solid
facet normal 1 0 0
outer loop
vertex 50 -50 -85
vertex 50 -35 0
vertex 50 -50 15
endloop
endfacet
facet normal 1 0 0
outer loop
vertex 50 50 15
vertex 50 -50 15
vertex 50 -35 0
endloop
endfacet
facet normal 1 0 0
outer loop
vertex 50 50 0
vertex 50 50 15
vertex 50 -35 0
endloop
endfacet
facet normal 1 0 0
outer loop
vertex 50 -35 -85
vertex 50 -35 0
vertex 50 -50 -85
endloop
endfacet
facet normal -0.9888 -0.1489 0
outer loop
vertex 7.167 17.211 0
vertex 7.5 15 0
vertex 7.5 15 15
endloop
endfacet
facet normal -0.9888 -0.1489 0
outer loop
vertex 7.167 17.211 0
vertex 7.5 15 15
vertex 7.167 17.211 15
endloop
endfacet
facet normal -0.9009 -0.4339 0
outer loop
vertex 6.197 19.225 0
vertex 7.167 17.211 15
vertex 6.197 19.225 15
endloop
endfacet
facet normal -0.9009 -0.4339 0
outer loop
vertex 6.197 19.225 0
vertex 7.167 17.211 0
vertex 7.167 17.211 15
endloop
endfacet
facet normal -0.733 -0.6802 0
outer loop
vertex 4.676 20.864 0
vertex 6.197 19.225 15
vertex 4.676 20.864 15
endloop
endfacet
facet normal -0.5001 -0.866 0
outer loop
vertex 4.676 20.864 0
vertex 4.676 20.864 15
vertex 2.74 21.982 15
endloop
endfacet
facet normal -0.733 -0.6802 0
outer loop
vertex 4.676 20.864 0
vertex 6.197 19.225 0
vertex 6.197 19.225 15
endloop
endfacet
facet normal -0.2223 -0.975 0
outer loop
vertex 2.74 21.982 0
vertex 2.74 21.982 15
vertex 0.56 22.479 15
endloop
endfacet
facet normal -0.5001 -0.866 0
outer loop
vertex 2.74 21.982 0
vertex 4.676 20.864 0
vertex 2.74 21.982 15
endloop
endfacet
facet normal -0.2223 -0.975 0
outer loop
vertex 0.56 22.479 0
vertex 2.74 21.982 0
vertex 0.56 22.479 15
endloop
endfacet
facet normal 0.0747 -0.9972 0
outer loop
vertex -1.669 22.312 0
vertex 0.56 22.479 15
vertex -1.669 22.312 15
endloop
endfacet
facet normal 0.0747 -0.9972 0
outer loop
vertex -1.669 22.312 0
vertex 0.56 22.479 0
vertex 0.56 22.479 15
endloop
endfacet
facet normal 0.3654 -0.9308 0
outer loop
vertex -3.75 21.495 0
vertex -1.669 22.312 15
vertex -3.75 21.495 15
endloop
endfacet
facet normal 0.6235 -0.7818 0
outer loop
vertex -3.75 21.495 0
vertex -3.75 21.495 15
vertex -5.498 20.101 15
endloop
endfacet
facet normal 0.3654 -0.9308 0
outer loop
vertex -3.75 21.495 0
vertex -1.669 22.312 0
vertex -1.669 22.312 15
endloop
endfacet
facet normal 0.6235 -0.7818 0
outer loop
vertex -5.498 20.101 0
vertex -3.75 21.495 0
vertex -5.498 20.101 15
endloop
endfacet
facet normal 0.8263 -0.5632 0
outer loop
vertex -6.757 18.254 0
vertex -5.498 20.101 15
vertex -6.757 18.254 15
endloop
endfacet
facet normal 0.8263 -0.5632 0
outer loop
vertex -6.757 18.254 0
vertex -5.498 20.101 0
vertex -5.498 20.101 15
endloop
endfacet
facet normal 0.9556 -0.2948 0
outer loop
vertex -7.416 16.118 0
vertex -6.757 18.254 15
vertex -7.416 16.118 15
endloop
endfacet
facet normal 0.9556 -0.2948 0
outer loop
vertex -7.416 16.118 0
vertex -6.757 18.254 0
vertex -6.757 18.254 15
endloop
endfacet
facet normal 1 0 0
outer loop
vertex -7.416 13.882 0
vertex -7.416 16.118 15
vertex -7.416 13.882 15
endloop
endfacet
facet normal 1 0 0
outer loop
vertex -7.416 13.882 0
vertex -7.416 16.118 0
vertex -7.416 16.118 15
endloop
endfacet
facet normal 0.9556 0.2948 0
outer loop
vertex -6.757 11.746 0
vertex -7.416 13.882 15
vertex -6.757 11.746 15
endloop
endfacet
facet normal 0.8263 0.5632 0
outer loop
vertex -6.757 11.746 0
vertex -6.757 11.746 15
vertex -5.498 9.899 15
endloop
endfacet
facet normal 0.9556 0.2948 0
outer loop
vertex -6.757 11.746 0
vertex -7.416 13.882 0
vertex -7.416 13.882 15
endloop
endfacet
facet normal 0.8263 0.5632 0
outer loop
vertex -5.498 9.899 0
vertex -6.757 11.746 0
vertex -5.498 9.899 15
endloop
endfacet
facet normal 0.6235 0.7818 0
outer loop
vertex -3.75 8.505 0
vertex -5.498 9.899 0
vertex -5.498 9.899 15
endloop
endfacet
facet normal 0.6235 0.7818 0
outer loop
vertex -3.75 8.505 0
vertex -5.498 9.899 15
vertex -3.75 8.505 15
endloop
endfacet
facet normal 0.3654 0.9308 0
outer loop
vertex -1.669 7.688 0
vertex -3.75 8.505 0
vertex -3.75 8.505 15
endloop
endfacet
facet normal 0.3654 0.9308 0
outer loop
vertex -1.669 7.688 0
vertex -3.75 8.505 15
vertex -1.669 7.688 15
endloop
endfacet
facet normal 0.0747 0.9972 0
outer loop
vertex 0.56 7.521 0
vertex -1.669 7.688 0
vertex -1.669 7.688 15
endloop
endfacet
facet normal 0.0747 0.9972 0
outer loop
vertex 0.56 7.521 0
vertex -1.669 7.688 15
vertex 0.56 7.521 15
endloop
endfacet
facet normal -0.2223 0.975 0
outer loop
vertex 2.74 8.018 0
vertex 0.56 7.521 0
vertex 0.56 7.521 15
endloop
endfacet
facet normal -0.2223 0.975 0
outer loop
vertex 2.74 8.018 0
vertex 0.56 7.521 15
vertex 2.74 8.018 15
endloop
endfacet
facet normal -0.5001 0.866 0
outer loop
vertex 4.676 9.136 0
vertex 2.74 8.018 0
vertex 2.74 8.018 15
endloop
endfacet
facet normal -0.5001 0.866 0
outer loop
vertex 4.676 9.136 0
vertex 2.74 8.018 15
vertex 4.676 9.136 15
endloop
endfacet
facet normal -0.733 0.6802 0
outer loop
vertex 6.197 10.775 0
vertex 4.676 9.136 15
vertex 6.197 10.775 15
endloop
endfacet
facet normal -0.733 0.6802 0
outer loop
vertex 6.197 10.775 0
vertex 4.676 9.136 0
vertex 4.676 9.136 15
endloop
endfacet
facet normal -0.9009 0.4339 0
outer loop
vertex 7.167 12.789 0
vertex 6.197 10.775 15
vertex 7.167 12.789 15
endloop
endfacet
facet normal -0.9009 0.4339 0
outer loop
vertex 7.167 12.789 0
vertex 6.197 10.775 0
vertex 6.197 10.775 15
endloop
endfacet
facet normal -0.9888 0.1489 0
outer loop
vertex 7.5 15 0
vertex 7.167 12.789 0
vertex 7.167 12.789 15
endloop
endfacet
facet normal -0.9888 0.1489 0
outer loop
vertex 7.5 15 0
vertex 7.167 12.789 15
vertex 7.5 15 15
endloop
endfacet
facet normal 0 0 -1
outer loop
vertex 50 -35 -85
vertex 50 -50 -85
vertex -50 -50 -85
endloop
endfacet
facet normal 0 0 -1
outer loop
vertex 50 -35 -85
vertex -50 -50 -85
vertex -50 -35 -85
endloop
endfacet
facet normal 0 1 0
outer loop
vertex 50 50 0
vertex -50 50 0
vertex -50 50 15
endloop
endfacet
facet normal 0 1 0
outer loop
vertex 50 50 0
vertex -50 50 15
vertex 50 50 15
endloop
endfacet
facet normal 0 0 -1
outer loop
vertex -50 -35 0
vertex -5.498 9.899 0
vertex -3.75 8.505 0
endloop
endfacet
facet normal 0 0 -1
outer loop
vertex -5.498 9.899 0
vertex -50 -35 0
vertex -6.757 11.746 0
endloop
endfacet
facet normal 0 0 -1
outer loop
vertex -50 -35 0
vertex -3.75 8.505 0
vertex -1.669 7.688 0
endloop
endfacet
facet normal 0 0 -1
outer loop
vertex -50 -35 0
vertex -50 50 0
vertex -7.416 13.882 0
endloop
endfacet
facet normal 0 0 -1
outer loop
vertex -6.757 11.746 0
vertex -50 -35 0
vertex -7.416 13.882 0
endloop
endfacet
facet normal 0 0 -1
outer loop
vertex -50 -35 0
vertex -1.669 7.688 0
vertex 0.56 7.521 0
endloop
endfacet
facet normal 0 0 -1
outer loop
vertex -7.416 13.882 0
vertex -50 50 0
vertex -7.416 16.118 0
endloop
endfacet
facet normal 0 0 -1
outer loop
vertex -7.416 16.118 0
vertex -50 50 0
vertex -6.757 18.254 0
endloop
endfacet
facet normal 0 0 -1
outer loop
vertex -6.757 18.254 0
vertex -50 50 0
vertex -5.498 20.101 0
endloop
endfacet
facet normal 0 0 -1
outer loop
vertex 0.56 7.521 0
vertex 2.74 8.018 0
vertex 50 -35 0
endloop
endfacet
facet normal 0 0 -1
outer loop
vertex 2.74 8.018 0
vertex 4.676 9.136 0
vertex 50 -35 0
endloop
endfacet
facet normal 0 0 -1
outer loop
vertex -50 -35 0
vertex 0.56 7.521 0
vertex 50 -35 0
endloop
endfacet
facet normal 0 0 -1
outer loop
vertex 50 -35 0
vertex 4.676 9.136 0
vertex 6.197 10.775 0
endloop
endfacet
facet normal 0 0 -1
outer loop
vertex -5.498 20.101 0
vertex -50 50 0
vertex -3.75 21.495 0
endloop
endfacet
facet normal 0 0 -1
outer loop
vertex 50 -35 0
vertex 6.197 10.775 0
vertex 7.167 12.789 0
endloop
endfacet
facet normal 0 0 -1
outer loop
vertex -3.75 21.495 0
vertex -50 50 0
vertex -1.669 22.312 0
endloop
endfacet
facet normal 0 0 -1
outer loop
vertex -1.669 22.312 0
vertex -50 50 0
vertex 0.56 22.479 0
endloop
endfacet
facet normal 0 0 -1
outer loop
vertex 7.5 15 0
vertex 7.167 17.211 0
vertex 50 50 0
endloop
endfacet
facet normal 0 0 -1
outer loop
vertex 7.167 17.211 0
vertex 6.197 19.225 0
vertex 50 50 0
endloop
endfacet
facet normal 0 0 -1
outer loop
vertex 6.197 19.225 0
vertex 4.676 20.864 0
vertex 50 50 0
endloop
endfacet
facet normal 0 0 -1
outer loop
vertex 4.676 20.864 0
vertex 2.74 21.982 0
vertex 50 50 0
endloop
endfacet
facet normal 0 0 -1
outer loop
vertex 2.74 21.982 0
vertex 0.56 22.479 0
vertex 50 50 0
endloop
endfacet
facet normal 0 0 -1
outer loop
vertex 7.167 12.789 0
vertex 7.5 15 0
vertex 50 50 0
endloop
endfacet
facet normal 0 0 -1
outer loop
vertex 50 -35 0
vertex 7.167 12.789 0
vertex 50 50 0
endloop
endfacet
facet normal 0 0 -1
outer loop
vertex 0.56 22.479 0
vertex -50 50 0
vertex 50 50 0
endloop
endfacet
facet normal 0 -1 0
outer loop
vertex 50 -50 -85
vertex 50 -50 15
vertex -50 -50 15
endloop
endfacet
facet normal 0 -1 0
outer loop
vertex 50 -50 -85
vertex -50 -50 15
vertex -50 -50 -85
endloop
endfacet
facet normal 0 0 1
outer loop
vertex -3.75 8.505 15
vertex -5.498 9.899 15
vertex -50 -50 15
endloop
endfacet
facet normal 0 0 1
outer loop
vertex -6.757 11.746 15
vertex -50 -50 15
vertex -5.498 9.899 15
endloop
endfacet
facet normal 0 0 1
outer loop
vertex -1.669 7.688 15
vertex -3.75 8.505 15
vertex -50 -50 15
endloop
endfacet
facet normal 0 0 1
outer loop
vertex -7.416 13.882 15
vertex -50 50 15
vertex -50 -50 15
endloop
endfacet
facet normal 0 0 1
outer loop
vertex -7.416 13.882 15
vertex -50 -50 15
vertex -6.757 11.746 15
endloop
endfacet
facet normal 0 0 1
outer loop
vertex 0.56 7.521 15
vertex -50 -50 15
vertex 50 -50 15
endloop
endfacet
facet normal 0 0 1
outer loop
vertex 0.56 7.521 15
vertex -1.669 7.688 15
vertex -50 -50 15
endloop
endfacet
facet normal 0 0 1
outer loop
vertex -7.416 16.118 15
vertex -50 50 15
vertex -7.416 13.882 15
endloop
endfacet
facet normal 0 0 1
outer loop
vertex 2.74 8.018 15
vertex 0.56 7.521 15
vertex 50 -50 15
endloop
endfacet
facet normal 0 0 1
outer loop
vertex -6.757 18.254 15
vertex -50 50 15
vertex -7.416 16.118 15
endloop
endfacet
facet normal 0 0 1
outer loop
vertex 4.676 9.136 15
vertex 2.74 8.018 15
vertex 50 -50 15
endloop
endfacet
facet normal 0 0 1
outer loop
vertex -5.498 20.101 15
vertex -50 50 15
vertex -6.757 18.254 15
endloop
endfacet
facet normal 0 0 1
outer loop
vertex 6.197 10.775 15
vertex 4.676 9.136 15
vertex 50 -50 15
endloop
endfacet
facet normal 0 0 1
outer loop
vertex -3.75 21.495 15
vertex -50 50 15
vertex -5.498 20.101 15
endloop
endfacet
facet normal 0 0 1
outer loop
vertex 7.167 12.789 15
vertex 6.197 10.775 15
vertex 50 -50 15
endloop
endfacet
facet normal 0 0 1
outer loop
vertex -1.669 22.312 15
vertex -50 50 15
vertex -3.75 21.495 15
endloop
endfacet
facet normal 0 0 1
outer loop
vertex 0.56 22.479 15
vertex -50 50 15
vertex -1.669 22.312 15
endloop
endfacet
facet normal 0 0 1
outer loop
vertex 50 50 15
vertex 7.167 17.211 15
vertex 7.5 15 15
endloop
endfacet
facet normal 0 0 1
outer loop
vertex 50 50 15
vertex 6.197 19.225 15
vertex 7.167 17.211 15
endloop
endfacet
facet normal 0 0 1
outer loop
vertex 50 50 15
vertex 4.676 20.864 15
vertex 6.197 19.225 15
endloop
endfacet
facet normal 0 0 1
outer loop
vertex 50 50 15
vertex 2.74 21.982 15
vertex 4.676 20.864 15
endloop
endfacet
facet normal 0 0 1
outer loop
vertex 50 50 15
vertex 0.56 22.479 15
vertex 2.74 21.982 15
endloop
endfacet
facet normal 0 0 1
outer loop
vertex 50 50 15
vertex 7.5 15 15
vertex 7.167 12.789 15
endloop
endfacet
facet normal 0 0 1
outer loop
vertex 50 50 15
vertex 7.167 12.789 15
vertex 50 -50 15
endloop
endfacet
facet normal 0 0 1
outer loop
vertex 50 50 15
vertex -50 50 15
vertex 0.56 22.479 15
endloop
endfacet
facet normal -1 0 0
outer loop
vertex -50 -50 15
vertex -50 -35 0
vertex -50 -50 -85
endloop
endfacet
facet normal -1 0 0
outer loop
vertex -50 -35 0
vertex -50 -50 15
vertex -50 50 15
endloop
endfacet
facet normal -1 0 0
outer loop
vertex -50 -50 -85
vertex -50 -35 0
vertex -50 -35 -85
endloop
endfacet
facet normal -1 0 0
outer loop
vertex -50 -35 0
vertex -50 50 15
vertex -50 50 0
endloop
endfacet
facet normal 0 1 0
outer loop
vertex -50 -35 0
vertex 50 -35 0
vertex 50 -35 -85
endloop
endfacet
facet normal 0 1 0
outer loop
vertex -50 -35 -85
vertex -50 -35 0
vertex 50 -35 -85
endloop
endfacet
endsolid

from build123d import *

# Parameters (mm, degrees)
SKETCH1_W           = 100
SKETCH1_H           = 100
SKETCH1_R           = 7.5
BOSS_EXTRUDE1_DEPTH = 15
SKETCH2_W           = 85
SKETCH2_H           = 15
BOSS_EXTRUDE2_DEPTH = 100


with BuildPart() as part:
    # Sketch1 → Boss-Extrude1 (new body)
    with BuildSketch(Plane.XY):
        Rectangle(SKETCH1_W, SKETCH1_H)
        with Locations((0, 15)):
            Circle(SKETCH1_R, mode=Mode.SUBTRACT)
    extrude(amount=BOSS_EXTRUDE1_DEPTH)

    # Sketch2 → Boss-Extrude2 (add)
    with BuildSketch(Plane(origin=(50, 0, 0), x_dir=(0, 0, -1), z_dir=(1, 0, 0))):
        with Locations((42.5, -42.5)):
            Rectangle(SKETCH2_W, SKETCH2_H)
    extrude(amount=-BOSS_EXTRUDE2_DEPTH)


solid = part.part
